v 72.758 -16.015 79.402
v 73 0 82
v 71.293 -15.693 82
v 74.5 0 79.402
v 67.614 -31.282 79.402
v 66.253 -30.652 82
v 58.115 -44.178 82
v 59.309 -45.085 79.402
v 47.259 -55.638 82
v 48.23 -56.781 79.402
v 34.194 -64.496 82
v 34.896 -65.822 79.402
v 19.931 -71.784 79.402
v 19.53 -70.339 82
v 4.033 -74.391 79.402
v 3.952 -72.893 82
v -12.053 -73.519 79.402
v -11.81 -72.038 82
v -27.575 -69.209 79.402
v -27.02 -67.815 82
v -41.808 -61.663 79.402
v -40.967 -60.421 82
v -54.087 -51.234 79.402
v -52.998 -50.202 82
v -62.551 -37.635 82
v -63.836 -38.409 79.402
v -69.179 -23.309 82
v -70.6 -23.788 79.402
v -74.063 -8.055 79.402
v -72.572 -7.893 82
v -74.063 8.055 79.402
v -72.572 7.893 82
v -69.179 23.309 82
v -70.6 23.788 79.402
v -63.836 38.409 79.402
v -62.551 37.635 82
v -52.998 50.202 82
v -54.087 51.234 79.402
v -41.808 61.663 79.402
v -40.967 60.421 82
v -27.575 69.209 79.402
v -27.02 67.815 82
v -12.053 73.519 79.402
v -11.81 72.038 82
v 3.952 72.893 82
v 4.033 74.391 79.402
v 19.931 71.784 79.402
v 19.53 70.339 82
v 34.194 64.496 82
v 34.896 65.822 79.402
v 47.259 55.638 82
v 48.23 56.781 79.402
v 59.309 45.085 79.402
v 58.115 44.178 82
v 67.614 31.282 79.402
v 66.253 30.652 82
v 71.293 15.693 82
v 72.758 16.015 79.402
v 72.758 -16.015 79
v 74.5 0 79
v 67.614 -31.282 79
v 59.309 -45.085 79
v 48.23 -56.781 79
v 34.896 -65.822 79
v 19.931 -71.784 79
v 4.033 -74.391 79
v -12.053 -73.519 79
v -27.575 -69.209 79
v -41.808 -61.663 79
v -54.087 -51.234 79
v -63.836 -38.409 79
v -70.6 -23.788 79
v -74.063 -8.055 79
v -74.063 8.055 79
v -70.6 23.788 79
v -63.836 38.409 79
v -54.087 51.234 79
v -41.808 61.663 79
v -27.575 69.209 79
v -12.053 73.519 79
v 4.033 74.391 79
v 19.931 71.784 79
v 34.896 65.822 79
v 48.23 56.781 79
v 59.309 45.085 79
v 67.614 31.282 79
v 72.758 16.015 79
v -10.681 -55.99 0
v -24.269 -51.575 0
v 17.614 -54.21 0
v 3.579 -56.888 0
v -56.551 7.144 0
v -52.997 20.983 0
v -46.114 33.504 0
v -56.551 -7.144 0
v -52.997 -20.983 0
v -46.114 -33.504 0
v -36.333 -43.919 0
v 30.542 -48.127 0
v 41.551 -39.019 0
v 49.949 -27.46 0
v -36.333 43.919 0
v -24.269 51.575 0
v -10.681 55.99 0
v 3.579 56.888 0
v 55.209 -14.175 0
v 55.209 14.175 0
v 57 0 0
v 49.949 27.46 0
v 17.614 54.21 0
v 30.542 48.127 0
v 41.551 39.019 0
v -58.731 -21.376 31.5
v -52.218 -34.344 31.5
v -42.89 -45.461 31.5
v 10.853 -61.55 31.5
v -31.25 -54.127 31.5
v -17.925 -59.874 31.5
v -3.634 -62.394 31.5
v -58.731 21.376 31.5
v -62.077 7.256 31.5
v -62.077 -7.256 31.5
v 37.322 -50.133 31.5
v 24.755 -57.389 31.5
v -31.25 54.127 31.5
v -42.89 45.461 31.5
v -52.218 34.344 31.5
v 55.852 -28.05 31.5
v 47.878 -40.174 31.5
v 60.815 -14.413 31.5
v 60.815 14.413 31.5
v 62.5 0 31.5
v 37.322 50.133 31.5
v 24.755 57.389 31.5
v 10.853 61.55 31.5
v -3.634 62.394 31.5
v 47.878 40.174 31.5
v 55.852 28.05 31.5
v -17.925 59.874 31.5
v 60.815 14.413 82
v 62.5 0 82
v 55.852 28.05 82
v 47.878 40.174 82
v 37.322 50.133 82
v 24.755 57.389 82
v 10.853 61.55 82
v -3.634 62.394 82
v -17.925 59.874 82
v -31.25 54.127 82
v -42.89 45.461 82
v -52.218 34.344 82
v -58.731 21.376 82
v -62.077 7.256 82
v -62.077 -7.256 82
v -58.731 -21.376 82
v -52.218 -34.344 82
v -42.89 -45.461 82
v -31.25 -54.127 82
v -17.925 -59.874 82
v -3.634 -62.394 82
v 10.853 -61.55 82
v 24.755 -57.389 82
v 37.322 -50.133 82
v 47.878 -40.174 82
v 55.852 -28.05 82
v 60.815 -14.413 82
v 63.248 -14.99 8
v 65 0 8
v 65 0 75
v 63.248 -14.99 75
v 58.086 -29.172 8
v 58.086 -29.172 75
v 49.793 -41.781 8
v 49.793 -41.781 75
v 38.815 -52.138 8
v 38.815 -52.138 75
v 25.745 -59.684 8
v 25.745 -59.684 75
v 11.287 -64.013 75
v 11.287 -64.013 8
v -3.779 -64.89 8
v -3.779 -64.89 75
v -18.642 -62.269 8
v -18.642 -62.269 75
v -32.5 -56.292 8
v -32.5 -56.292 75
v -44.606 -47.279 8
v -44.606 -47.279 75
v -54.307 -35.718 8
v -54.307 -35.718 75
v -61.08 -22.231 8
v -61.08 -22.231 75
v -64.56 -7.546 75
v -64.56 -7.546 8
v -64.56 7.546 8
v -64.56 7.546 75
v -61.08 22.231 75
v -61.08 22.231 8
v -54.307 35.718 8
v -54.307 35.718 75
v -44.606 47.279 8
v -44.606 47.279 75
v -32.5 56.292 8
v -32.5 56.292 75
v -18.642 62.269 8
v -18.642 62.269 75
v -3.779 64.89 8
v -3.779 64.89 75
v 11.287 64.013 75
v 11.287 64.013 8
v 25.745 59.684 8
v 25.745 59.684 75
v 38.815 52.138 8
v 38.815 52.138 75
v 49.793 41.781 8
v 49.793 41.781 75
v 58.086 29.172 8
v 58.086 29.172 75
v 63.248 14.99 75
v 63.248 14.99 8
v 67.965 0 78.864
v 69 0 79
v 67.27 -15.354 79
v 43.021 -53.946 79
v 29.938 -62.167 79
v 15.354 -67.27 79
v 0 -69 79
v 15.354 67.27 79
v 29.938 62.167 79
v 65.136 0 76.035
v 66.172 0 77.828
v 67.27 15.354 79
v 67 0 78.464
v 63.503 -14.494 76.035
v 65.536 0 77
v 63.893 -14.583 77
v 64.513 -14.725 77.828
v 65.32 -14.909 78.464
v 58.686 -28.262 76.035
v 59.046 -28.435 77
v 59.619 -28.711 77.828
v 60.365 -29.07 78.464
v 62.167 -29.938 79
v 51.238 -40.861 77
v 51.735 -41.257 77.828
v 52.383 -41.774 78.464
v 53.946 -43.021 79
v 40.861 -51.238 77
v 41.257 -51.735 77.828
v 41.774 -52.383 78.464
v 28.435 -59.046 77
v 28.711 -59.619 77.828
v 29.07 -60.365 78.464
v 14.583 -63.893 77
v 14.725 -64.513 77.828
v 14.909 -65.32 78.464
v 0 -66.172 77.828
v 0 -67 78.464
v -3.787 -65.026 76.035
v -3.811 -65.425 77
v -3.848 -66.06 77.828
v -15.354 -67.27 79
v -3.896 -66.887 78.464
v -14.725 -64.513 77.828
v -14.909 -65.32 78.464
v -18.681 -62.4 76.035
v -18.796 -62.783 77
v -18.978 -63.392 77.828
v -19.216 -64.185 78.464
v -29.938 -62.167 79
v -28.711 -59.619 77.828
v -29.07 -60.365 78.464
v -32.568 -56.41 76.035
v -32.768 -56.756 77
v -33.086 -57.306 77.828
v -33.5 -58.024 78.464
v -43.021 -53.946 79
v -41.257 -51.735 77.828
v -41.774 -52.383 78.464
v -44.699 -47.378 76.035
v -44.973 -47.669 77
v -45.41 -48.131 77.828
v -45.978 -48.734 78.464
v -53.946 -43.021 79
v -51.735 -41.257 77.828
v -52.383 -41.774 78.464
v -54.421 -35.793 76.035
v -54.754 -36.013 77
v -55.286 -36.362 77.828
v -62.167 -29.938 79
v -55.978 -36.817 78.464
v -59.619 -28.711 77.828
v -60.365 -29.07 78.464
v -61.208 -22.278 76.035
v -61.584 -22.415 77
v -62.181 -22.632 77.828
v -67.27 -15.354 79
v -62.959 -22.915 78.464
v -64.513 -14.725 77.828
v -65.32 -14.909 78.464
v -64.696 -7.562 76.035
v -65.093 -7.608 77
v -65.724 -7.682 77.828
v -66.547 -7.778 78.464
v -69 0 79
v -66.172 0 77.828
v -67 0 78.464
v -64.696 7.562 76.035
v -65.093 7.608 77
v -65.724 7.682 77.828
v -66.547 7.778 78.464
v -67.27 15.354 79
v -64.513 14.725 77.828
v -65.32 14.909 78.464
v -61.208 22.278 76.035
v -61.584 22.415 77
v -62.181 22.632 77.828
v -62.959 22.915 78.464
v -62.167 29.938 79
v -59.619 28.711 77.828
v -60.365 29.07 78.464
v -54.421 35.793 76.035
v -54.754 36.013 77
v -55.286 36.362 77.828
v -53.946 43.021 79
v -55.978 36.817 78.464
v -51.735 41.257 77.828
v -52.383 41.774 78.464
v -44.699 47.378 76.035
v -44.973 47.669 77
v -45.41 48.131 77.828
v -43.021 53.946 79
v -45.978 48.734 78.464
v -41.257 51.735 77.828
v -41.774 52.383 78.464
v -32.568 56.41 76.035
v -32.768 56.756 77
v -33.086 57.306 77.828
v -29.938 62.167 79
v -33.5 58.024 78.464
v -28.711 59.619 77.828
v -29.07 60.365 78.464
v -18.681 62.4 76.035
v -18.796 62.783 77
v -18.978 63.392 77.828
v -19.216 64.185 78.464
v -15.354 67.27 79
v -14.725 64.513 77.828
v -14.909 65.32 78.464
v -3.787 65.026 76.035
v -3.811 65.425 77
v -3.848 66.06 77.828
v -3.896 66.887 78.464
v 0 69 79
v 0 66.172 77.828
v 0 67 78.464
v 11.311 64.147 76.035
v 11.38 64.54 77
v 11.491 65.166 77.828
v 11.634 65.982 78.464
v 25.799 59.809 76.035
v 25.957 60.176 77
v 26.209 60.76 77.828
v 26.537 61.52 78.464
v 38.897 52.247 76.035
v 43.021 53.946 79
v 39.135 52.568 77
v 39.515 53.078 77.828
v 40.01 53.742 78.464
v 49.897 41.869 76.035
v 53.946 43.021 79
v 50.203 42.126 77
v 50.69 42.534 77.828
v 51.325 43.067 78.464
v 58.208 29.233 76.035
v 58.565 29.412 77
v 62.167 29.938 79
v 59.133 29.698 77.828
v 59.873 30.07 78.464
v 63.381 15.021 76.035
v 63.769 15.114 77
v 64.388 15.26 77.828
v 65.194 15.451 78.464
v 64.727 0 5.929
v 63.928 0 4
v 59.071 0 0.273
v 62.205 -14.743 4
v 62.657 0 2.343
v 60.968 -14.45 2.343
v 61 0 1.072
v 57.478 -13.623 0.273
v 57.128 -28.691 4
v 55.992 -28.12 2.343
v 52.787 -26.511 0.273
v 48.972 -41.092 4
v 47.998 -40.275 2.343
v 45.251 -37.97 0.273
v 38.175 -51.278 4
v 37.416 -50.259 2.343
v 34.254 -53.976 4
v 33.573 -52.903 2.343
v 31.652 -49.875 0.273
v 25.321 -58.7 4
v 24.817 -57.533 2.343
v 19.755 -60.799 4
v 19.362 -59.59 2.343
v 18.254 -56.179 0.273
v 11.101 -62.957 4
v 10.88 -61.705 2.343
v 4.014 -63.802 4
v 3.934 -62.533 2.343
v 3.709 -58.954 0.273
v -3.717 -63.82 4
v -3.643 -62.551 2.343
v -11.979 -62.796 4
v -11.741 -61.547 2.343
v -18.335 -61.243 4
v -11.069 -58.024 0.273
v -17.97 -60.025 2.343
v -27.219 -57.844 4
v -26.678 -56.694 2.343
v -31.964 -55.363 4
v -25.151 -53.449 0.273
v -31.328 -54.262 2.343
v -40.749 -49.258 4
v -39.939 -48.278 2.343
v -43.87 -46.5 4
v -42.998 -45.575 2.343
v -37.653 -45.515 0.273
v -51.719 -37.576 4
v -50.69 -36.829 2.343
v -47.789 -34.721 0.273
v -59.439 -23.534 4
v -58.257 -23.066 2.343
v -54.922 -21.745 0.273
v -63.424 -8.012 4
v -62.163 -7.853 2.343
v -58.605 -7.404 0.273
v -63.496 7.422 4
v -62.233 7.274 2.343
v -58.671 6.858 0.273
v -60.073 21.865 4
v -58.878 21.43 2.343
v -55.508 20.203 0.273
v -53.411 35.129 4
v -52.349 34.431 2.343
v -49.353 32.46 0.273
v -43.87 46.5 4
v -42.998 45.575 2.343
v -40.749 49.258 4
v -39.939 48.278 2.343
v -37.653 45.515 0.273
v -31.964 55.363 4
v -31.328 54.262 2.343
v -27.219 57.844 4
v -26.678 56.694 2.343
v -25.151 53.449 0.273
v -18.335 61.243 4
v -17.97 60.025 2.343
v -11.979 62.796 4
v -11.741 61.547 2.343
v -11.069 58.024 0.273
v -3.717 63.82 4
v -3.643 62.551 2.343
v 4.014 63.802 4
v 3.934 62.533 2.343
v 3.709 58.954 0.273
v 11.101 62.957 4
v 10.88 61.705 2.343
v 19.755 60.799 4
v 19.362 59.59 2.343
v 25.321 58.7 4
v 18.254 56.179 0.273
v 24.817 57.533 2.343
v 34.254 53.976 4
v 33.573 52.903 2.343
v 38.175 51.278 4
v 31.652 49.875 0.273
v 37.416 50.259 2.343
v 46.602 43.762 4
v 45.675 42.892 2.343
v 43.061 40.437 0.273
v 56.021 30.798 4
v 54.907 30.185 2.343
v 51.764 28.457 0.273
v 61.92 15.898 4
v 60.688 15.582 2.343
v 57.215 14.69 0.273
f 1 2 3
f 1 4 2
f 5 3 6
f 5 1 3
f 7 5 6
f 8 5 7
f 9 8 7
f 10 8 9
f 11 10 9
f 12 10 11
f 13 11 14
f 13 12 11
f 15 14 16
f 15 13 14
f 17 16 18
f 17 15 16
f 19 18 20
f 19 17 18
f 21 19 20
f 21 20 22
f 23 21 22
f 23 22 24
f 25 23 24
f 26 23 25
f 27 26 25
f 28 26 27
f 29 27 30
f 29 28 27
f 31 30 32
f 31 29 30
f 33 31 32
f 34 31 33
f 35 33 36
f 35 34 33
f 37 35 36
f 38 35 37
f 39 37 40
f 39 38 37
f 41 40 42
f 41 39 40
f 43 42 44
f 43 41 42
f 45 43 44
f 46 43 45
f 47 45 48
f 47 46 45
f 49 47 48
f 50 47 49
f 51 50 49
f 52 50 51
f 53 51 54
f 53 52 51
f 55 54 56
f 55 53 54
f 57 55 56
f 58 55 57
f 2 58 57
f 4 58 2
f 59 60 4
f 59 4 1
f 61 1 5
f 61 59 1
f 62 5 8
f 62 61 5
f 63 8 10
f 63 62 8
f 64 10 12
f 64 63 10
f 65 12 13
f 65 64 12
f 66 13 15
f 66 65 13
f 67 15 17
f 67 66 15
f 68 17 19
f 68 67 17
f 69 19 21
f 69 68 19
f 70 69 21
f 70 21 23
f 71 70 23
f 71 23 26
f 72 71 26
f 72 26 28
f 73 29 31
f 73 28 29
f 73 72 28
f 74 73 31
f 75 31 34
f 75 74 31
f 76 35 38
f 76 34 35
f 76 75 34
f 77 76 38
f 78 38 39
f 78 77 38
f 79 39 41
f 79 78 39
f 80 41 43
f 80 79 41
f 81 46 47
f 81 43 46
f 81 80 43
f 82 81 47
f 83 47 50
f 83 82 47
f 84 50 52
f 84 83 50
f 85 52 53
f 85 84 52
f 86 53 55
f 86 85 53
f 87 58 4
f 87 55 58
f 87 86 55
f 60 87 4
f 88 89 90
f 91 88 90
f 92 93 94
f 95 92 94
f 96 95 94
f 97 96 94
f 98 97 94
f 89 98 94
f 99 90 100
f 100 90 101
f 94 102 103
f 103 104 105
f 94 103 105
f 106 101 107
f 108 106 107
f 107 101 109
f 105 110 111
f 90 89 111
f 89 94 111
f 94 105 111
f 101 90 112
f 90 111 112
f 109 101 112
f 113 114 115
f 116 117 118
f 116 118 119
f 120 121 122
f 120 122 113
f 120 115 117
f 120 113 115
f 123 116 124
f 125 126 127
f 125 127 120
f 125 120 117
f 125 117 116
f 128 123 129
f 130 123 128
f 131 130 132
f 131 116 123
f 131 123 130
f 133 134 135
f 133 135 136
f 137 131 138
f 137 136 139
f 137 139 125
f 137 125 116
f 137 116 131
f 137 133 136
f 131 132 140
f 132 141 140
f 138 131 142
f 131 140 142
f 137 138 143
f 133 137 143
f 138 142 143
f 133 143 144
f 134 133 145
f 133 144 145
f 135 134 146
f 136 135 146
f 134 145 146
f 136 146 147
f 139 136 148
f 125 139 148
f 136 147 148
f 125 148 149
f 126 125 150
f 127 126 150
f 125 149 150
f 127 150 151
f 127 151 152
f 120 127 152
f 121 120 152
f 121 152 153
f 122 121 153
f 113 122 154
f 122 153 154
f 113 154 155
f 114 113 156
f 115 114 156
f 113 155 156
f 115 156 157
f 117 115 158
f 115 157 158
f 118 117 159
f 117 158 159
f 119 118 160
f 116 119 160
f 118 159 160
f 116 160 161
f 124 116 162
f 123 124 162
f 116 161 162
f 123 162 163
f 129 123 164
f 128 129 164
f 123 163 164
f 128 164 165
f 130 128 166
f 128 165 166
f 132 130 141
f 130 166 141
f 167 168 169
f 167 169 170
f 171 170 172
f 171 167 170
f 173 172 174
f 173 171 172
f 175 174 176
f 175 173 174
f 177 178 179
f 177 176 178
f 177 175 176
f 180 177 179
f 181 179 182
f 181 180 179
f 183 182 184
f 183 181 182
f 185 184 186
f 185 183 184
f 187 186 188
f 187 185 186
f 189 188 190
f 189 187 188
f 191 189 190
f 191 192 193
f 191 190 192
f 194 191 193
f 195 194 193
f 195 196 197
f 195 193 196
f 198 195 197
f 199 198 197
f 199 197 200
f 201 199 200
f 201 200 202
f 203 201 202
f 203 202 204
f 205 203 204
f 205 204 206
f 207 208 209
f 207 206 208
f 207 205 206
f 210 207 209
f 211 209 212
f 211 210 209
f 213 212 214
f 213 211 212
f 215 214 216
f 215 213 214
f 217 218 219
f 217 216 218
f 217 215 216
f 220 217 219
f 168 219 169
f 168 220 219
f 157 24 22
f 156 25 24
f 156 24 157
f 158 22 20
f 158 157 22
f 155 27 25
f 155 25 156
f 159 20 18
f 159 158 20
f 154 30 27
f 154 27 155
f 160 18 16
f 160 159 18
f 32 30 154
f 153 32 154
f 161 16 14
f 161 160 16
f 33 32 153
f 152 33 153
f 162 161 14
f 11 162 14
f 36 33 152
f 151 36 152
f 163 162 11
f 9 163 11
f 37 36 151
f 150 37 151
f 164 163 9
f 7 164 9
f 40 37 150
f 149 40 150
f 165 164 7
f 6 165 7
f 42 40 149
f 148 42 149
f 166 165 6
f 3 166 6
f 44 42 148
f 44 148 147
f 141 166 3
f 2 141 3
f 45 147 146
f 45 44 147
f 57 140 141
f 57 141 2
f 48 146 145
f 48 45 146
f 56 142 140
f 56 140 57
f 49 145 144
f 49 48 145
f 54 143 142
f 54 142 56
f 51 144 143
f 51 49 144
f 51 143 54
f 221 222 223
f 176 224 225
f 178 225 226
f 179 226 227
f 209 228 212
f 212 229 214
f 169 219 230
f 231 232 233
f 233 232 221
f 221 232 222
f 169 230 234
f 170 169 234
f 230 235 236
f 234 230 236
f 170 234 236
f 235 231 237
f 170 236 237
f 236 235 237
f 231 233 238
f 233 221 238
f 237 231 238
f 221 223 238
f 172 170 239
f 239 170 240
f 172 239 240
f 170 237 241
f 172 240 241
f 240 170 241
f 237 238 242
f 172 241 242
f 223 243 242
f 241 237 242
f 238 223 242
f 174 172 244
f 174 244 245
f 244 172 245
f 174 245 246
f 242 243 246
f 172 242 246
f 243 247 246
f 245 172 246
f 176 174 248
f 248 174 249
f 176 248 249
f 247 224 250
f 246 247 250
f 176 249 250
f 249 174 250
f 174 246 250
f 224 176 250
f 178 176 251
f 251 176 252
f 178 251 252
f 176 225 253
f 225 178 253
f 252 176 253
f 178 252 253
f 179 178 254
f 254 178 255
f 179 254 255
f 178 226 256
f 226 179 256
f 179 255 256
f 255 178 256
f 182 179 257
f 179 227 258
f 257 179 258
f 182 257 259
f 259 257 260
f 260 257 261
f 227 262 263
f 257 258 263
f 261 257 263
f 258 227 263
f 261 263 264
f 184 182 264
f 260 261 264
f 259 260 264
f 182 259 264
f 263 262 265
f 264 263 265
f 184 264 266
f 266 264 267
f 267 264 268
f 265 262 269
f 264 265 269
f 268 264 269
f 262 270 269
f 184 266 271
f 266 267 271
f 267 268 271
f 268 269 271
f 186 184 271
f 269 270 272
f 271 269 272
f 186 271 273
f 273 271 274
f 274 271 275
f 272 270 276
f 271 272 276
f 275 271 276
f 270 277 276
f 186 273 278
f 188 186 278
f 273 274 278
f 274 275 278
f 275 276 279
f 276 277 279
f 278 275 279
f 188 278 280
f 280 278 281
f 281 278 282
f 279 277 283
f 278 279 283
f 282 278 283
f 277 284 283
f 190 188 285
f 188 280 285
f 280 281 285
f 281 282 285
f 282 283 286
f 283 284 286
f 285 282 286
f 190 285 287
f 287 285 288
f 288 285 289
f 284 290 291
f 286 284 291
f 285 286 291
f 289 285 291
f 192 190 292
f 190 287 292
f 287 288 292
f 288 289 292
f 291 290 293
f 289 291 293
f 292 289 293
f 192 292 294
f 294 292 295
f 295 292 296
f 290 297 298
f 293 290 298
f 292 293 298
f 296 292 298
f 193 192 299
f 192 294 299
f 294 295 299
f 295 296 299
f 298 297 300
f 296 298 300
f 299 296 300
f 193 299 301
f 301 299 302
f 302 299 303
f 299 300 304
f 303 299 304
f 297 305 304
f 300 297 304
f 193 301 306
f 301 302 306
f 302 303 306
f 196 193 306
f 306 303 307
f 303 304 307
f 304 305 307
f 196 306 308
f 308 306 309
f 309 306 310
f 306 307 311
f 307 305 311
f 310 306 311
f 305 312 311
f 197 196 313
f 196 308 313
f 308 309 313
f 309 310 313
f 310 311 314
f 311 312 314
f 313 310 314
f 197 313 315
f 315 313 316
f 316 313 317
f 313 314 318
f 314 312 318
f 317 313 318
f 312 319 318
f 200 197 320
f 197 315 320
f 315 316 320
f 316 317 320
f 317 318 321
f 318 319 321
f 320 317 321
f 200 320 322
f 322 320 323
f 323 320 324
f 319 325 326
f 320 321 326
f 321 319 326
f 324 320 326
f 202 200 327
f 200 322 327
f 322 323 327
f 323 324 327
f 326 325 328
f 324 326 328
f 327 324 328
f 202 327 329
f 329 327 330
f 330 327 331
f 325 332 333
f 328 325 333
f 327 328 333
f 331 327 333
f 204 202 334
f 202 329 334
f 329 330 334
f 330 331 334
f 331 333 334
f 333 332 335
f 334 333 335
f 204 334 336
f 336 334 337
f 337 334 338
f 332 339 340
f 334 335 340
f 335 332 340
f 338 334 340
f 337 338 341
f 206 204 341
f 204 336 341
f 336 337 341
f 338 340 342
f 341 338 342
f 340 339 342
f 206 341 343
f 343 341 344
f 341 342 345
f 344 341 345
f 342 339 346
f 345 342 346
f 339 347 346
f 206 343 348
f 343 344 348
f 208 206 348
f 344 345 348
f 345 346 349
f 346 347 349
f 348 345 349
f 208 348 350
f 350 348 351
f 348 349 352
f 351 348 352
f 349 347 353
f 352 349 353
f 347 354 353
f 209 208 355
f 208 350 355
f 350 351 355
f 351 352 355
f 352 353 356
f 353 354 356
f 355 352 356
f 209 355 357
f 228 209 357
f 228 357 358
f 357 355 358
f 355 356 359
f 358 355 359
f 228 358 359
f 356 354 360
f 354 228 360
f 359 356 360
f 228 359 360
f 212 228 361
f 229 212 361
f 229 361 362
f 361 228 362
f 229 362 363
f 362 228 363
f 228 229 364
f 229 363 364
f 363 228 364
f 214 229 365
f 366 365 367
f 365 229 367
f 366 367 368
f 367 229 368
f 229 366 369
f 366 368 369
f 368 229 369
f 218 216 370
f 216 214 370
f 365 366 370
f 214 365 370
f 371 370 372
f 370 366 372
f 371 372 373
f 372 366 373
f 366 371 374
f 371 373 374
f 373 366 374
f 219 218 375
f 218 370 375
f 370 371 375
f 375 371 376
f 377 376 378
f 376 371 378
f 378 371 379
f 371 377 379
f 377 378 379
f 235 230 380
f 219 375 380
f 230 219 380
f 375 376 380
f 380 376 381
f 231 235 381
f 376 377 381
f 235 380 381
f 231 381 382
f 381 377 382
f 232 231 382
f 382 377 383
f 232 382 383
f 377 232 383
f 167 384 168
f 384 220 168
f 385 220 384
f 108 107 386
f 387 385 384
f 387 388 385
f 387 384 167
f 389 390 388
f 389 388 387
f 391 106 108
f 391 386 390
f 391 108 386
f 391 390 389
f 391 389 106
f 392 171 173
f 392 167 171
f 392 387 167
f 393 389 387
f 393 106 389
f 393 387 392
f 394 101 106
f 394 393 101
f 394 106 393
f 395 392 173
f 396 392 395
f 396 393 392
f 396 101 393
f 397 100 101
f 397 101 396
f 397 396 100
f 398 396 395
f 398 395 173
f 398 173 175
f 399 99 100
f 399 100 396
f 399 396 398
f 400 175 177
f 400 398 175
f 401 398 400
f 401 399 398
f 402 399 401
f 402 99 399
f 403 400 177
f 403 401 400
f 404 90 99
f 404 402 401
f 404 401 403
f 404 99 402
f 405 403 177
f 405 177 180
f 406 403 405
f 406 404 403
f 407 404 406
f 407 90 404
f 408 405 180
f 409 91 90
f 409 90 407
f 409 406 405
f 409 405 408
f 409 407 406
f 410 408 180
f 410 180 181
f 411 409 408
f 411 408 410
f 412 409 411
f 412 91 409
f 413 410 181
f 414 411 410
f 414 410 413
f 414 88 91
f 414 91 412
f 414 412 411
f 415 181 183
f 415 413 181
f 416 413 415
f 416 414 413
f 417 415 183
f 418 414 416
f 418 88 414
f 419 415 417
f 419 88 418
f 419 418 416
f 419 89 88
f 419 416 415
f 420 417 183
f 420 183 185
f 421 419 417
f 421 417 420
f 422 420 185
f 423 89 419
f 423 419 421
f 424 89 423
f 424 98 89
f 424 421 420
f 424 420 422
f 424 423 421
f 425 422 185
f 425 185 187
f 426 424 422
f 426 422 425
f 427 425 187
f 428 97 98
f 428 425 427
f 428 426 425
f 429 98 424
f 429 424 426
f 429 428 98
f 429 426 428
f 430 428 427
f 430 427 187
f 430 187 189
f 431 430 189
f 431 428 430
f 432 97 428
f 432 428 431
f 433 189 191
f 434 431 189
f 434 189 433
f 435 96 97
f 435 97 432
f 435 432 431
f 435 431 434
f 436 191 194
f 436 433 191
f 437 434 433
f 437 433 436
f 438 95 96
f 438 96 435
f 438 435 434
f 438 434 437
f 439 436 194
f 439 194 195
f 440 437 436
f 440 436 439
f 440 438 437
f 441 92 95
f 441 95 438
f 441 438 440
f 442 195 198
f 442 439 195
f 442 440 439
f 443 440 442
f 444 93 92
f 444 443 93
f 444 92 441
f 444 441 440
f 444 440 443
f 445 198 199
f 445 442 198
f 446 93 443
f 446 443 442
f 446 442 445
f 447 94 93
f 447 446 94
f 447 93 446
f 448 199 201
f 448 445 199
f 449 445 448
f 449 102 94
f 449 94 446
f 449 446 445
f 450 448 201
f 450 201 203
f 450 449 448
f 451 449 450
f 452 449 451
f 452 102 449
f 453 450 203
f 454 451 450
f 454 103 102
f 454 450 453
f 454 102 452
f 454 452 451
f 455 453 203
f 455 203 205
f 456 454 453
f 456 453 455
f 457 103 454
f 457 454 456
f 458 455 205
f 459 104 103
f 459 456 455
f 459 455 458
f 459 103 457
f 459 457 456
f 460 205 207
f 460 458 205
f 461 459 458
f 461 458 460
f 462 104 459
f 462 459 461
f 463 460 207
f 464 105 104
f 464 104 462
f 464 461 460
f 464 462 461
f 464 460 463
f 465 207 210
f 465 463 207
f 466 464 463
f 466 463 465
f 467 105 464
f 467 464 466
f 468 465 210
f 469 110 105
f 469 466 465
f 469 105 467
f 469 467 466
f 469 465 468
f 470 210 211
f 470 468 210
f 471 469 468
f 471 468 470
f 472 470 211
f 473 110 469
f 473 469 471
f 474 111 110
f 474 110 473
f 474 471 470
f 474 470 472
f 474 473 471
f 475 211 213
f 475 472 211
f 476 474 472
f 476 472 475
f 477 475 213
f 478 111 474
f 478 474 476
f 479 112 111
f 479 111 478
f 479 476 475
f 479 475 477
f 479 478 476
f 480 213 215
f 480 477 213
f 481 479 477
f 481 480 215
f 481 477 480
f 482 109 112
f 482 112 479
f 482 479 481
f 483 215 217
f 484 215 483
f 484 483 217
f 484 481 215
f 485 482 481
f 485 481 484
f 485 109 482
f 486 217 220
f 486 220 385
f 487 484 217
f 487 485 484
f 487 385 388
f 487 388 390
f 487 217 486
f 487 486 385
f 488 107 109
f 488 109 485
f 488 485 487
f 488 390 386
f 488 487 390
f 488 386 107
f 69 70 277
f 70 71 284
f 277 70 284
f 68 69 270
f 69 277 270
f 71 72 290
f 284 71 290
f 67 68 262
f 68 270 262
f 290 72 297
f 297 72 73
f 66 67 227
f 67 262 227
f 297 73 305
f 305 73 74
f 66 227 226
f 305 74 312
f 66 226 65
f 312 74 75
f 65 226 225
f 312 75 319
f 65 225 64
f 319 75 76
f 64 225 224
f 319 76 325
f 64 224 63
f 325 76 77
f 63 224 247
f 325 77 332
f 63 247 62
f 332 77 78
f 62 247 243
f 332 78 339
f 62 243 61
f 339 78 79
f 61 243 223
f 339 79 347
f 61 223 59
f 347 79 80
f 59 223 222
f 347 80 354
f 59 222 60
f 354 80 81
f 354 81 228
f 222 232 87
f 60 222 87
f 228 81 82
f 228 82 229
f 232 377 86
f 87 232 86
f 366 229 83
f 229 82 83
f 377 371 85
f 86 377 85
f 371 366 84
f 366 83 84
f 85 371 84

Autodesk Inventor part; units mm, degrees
ref_plane "YZ Plane" through (0, 0, 0) normal (1, 0, 0) x (0, 1, 0)
ref_plane "XZ Plane" through (0, 0, 0) normal (0, 1, 0) x (-1, 0, 0)
ref_plane "XY Plane" through (0, 0, 0) normal (0, 0, 1) x (1, 0, 0)
sketch "Esquisse1" plane through (0, 0, 0) normal (0, 0, 1) x (1, 0, 0)
  circle A0 centre (0, 0) radius 65
  dimension "d0" = 130
extrude "Extrusion1" add sketch "Esquisse1" along normal blind 79
sketch "Esquisse2" plane through (0, 0, 79) normal (0, 0, 1) x (1, 0, 0)
  circle A0 centre (0, 0) radius 74.5
  dimension "d3" = 149
extrude "Extrusion2" add sketch "Esquisse2" along normal blind 3
sketch "Esquisse3" plane through (0, 0, 82) normal (0, 0, 1) x (1, 0, 0)
  circle A0 centre (0, 0) radius 62.5
  dimension "d6" = 125
extrude "Extrusion3" cut sketch "Esquisse3" against normal blind 50.5
fillet "Congé1" radius 8 1 edges at (-65, 0, 0)
fillet "Congé2" radius 4 1 edges at (-65, 0, 79)
chamfer "Chanfrein1" distance 1.5 angle 60 1 edges at (-74.5, 0, 82) measured on face at (-31.6394, -62.7681, 82)
equation "\"nombredor\" = 1.61803"
equation "\"pi\" = 3.141593"
properties part number "Bol" material "Acier inoxydable"
